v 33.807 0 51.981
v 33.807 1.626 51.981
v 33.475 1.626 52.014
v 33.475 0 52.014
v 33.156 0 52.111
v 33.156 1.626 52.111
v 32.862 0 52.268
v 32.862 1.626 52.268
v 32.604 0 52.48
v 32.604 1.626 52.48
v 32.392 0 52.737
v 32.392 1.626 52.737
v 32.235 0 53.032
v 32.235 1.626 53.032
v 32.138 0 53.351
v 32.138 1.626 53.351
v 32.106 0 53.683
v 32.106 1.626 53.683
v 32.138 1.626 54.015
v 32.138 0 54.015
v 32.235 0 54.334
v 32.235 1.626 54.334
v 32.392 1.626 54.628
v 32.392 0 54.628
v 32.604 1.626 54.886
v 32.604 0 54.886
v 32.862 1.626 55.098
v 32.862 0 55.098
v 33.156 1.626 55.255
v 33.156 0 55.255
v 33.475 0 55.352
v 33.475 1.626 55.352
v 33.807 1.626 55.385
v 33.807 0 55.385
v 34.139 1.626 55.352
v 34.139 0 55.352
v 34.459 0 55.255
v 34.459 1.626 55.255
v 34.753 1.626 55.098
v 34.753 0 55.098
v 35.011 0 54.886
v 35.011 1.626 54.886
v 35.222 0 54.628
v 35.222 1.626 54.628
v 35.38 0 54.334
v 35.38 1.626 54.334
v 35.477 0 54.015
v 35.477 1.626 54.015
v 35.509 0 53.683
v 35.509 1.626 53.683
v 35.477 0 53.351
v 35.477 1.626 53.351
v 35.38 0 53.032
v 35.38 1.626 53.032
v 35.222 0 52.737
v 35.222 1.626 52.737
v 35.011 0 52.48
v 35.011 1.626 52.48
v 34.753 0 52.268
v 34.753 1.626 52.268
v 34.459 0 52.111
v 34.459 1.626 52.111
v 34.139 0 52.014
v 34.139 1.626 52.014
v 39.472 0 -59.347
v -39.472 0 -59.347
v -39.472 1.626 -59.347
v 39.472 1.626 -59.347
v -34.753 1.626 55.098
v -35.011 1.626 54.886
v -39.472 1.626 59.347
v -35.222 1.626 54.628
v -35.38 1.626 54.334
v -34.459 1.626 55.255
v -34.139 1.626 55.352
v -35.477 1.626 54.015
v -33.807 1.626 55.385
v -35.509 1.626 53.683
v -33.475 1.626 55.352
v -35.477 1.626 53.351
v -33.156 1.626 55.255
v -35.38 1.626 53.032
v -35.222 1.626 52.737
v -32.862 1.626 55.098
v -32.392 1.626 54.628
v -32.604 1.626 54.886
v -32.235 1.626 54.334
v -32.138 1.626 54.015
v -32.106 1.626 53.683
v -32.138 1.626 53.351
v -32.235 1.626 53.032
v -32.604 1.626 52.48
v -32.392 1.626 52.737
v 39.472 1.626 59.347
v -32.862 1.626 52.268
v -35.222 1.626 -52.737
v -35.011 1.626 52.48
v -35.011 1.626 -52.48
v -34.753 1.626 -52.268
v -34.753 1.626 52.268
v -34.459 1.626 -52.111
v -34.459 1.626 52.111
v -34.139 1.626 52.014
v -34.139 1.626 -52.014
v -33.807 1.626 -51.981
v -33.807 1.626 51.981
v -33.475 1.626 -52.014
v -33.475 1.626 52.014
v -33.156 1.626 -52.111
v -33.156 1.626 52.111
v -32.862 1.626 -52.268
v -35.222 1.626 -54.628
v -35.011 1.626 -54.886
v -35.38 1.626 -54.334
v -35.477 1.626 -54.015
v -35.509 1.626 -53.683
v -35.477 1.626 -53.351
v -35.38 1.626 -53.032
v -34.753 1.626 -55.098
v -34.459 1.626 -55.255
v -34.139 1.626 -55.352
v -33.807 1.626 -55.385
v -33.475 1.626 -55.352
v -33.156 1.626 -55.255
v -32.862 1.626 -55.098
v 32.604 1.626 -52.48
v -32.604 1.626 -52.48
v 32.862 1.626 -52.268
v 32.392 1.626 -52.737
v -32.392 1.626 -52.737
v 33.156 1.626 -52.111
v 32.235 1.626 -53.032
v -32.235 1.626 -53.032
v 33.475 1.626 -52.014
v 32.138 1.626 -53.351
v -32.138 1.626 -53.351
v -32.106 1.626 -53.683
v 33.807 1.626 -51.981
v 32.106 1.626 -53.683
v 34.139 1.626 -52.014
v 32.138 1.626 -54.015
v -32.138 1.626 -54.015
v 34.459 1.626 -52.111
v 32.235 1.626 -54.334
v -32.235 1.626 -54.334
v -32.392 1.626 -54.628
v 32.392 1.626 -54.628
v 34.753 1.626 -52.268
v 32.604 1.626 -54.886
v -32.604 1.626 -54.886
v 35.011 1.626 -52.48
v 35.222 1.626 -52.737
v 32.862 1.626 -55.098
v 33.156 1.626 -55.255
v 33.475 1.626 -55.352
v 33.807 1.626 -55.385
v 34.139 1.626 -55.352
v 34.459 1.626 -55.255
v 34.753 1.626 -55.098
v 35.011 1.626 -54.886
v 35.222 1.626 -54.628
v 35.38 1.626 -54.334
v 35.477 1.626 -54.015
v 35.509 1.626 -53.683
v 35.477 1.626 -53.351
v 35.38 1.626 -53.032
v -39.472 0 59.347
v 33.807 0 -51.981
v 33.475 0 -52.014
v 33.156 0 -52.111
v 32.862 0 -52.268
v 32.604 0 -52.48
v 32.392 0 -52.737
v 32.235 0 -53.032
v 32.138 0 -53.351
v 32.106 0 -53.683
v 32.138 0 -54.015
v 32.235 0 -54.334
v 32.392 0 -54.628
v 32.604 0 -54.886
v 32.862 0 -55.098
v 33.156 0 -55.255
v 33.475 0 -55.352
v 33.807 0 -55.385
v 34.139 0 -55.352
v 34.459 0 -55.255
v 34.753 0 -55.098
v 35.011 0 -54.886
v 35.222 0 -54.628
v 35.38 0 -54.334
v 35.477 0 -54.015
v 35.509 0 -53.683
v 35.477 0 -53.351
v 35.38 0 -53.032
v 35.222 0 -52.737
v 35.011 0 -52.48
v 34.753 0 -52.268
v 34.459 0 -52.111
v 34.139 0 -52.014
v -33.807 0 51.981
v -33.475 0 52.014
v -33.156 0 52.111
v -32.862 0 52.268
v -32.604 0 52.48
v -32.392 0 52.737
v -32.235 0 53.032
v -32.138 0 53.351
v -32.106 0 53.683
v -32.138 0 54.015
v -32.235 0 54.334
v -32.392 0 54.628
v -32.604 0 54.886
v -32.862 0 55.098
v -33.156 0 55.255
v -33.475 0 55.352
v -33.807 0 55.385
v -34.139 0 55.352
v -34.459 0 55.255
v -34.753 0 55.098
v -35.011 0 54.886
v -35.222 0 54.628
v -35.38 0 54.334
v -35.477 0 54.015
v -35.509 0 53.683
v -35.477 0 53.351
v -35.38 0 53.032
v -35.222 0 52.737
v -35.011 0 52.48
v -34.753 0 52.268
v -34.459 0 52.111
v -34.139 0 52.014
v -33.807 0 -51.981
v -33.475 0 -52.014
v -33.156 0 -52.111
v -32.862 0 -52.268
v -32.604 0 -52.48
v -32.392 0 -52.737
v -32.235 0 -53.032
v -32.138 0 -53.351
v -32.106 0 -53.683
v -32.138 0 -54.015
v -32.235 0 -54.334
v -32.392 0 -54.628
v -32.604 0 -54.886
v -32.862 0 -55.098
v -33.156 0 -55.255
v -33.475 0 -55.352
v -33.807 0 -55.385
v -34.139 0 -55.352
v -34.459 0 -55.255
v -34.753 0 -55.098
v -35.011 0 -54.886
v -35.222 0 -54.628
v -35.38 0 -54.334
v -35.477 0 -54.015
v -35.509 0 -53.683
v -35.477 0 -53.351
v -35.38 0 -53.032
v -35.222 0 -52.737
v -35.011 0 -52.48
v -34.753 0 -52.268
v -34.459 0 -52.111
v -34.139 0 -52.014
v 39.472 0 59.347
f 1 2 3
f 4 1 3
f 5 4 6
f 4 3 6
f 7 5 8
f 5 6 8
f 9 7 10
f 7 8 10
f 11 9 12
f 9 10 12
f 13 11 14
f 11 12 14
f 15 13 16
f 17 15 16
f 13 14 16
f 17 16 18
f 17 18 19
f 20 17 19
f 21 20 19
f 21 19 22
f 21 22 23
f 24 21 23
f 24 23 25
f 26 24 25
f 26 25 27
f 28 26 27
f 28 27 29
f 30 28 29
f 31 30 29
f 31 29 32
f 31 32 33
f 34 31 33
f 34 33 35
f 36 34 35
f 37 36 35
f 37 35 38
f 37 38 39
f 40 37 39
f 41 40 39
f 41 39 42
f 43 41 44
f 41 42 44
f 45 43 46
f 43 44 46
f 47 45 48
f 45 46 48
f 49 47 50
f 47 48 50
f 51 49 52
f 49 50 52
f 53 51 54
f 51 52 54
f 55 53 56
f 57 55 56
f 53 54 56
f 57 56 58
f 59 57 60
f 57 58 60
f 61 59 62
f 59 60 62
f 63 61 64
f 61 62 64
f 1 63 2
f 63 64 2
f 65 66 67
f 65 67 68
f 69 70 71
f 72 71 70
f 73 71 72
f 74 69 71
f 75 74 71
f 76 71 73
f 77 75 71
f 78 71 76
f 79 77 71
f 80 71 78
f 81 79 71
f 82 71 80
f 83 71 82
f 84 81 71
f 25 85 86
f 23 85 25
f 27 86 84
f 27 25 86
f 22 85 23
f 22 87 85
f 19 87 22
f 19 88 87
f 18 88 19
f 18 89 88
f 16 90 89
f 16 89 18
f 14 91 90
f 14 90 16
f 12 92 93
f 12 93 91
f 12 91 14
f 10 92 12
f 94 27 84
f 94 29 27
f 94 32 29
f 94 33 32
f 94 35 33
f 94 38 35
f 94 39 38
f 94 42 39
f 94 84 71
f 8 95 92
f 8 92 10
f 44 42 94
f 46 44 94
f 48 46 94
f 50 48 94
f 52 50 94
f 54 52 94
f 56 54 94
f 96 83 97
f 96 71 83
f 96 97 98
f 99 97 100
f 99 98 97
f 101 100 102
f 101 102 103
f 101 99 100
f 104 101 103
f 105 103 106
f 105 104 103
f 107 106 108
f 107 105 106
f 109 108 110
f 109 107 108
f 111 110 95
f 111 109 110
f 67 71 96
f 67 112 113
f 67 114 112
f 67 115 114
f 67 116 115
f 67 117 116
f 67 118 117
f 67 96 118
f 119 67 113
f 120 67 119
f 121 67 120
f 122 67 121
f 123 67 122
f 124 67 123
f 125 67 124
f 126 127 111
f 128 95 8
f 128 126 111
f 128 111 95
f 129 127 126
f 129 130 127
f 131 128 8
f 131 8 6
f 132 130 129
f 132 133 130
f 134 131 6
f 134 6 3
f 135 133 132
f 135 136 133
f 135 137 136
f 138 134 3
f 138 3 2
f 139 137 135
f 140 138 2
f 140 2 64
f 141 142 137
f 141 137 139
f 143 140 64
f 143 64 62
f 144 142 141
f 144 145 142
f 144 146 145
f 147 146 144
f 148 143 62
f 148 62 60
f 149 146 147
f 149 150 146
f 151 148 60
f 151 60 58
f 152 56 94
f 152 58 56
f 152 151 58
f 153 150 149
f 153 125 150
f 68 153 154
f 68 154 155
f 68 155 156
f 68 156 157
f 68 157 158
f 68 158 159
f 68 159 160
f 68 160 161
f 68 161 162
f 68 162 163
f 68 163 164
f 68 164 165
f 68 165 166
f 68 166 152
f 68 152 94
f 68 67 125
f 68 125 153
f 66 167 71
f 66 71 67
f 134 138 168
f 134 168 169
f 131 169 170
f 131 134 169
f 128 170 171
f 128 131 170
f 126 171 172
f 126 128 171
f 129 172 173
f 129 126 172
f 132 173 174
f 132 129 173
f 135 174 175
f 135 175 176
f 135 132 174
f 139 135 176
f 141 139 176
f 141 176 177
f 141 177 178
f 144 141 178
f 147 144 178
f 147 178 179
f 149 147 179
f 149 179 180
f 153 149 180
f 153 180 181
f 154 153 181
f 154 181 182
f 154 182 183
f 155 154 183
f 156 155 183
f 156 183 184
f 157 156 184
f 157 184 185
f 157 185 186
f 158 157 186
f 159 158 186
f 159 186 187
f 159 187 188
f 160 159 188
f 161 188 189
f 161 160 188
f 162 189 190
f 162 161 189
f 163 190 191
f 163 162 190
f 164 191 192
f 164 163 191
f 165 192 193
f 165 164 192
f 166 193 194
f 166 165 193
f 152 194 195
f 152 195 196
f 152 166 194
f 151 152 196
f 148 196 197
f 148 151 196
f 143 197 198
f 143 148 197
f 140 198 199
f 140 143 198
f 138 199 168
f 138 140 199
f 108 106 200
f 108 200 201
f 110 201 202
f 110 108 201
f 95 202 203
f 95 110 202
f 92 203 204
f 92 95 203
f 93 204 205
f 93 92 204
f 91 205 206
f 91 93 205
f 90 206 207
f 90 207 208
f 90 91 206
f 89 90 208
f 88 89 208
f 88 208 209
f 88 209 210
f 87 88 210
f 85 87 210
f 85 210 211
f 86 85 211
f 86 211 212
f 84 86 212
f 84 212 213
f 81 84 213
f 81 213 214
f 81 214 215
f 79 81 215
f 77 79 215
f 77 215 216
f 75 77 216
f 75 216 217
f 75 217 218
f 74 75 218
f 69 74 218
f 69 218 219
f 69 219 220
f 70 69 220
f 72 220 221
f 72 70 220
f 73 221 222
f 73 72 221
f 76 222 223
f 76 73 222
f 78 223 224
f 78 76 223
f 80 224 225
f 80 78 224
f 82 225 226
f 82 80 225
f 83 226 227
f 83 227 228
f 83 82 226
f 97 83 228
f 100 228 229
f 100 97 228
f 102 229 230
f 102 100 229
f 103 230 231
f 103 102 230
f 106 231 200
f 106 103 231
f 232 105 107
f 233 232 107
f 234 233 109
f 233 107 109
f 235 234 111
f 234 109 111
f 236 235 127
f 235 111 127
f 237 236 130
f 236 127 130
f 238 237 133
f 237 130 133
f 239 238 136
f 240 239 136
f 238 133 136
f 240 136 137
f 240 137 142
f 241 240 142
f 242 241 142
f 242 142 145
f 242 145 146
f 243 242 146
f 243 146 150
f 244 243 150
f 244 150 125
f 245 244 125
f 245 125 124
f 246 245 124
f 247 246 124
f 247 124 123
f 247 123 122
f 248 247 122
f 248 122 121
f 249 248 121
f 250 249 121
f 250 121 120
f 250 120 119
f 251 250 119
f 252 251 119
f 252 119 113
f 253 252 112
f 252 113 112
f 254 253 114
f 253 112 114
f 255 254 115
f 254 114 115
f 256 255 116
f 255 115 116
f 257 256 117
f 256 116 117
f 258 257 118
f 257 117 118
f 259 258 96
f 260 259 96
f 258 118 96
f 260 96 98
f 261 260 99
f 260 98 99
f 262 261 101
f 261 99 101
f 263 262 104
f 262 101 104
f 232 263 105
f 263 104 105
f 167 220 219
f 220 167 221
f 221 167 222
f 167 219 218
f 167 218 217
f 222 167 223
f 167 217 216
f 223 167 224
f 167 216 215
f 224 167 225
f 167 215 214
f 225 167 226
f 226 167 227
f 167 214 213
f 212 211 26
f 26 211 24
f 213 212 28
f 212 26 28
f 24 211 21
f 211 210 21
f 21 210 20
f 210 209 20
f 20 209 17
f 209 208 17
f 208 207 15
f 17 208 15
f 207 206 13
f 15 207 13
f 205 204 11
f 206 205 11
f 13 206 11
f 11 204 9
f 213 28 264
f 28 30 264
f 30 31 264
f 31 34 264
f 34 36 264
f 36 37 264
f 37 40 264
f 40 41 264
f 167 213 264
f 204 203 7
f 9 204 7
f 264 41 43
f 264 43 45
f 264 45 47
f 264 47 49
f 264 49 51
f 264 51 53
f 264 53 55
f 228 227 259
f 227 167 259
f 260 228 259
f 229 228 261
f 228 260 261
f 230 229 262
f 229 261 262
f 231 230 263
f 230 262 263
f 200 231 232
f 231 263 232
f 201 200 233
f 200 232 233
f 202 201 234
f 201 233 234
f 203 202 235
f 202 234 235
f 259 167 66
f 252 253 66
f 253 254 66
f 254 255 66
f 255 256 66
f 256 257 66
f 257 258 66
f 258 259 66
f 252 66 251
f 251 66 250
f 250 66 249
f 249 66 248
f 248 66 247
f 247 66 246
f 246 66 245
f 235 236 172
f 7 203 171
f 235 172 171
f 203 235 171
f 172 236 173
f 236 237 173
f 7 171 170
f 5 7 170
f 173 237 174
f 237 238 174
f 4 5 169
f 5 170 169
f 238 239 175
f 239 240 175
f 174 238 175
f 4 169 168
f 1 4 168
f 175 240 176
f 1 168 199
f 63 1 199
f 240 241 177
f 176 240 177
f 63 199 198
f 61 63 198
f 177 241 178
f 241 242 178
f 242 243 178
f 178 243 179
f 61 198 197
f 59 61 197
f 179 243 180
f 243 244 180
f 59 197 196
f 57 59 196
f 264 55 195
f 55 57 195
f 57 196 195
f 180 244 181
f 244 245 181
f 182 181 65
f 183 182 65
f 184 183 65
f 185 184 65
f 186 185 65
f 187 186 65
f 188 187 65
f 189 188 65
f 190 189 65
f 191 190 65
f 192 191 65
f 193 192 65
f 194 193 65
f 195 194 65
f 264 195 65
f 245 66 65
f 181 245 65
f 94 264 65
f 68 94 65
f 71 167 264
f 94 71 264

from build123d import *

# Parameters (mm, degrees)
SKETCH1_W               = 78.9432
SKETCH1_H               = 118.6942
BOSS_EXTRUDE1_DEPTH     = 1.6256
CUT_EXTRUDE1_REACH      = 73.293
SKETCH2_R               = 1.7018
MIRROR2_COPY_1_REACH    = 73.293
MIRROR2_COPY_1_SKETCH_R = 1.7018


with BuildPart() as part:
    # Sketch1 → Boss-Extrude1 (new body)
    with BuildSketch(Plane(origin=(0, 0, 0), x_dir=(1, 0, 0), z_dir=(0, 1, 0))):
        Rectangle(SKETCH1_W, SKETCH1_H)
    extrude(amount=BOSS_EXTRUDE1_DEPTH)

    # Sketch2 → Cut-Extrude1 (cut, up to next)
    with BuildSketch(Plane(origin=(0, 1.6256, 0), x_dir=(1, 0, 0), z_dir=(0, 1, 0)), mode=Mode.PRIVATE) as cut_extrude1_sk1:
        with Locations(Location((-33.8074, 53.6829, 0), (0, 0, 270))):
            Circle(SKETCH2_R)
    cut_extrude1_tool1 = extrude(cut_extrude1_sk1.sketch, amount=-CUT_EXTRUDE1_REACH, mode=Mode.PRIVATE) & part.part
    cut_extrude1 = cut_extrude1_tool1.solids().sort_by_distance((-33.8074, 1.6256, -53.6829))[0]
    add(cut_extrude1, mode=Mode.SUBTRACT)

    # Mirror1: Cut-Extrude1 across plane
    add(cut_extrude1.mirror(Plane(origin=(0, 0, 0), x_dir=(0, 0, 1), z_dir=(1, 0, 0))), mode=Mode.SUBTRACT)

    # Mirror2: Cut-Extrude1 across plane
    add(cut_extrude1.mirror(Plane.XY), mode=Mode.SUBTRACT)

    # Mirror2 copy 1 sketch → Mirror2 copy 1 (cut, up to next)
    with BuildSketch(Plane(origin=(0, 1.6256, 0), x_dir=(-1, 0, 0), z_dir=(0, 1, 0)), mode=Mode.PRIVATE) as mirror2_copy_1_sk1:
        with Locations(Location((-33.8074, 53.6829, 0), (0, 0, 270))):
            Circle(MIRROR2_COPY_1_SKETCH_R)
    mirror2_copy_1_tool1 = extrude(mirror2_copy_1_sk1.sketch, amount=-MIRROR2_COPY_1_REACH, mode=Mode.PRIVATE) & part.part
    add(mirror2_copy_1_tool1.solids().sort_by_distance((33.8074, 1.6256, 53.6829))[0], mode=Mode.SUBTRACT)


solid = part.part
